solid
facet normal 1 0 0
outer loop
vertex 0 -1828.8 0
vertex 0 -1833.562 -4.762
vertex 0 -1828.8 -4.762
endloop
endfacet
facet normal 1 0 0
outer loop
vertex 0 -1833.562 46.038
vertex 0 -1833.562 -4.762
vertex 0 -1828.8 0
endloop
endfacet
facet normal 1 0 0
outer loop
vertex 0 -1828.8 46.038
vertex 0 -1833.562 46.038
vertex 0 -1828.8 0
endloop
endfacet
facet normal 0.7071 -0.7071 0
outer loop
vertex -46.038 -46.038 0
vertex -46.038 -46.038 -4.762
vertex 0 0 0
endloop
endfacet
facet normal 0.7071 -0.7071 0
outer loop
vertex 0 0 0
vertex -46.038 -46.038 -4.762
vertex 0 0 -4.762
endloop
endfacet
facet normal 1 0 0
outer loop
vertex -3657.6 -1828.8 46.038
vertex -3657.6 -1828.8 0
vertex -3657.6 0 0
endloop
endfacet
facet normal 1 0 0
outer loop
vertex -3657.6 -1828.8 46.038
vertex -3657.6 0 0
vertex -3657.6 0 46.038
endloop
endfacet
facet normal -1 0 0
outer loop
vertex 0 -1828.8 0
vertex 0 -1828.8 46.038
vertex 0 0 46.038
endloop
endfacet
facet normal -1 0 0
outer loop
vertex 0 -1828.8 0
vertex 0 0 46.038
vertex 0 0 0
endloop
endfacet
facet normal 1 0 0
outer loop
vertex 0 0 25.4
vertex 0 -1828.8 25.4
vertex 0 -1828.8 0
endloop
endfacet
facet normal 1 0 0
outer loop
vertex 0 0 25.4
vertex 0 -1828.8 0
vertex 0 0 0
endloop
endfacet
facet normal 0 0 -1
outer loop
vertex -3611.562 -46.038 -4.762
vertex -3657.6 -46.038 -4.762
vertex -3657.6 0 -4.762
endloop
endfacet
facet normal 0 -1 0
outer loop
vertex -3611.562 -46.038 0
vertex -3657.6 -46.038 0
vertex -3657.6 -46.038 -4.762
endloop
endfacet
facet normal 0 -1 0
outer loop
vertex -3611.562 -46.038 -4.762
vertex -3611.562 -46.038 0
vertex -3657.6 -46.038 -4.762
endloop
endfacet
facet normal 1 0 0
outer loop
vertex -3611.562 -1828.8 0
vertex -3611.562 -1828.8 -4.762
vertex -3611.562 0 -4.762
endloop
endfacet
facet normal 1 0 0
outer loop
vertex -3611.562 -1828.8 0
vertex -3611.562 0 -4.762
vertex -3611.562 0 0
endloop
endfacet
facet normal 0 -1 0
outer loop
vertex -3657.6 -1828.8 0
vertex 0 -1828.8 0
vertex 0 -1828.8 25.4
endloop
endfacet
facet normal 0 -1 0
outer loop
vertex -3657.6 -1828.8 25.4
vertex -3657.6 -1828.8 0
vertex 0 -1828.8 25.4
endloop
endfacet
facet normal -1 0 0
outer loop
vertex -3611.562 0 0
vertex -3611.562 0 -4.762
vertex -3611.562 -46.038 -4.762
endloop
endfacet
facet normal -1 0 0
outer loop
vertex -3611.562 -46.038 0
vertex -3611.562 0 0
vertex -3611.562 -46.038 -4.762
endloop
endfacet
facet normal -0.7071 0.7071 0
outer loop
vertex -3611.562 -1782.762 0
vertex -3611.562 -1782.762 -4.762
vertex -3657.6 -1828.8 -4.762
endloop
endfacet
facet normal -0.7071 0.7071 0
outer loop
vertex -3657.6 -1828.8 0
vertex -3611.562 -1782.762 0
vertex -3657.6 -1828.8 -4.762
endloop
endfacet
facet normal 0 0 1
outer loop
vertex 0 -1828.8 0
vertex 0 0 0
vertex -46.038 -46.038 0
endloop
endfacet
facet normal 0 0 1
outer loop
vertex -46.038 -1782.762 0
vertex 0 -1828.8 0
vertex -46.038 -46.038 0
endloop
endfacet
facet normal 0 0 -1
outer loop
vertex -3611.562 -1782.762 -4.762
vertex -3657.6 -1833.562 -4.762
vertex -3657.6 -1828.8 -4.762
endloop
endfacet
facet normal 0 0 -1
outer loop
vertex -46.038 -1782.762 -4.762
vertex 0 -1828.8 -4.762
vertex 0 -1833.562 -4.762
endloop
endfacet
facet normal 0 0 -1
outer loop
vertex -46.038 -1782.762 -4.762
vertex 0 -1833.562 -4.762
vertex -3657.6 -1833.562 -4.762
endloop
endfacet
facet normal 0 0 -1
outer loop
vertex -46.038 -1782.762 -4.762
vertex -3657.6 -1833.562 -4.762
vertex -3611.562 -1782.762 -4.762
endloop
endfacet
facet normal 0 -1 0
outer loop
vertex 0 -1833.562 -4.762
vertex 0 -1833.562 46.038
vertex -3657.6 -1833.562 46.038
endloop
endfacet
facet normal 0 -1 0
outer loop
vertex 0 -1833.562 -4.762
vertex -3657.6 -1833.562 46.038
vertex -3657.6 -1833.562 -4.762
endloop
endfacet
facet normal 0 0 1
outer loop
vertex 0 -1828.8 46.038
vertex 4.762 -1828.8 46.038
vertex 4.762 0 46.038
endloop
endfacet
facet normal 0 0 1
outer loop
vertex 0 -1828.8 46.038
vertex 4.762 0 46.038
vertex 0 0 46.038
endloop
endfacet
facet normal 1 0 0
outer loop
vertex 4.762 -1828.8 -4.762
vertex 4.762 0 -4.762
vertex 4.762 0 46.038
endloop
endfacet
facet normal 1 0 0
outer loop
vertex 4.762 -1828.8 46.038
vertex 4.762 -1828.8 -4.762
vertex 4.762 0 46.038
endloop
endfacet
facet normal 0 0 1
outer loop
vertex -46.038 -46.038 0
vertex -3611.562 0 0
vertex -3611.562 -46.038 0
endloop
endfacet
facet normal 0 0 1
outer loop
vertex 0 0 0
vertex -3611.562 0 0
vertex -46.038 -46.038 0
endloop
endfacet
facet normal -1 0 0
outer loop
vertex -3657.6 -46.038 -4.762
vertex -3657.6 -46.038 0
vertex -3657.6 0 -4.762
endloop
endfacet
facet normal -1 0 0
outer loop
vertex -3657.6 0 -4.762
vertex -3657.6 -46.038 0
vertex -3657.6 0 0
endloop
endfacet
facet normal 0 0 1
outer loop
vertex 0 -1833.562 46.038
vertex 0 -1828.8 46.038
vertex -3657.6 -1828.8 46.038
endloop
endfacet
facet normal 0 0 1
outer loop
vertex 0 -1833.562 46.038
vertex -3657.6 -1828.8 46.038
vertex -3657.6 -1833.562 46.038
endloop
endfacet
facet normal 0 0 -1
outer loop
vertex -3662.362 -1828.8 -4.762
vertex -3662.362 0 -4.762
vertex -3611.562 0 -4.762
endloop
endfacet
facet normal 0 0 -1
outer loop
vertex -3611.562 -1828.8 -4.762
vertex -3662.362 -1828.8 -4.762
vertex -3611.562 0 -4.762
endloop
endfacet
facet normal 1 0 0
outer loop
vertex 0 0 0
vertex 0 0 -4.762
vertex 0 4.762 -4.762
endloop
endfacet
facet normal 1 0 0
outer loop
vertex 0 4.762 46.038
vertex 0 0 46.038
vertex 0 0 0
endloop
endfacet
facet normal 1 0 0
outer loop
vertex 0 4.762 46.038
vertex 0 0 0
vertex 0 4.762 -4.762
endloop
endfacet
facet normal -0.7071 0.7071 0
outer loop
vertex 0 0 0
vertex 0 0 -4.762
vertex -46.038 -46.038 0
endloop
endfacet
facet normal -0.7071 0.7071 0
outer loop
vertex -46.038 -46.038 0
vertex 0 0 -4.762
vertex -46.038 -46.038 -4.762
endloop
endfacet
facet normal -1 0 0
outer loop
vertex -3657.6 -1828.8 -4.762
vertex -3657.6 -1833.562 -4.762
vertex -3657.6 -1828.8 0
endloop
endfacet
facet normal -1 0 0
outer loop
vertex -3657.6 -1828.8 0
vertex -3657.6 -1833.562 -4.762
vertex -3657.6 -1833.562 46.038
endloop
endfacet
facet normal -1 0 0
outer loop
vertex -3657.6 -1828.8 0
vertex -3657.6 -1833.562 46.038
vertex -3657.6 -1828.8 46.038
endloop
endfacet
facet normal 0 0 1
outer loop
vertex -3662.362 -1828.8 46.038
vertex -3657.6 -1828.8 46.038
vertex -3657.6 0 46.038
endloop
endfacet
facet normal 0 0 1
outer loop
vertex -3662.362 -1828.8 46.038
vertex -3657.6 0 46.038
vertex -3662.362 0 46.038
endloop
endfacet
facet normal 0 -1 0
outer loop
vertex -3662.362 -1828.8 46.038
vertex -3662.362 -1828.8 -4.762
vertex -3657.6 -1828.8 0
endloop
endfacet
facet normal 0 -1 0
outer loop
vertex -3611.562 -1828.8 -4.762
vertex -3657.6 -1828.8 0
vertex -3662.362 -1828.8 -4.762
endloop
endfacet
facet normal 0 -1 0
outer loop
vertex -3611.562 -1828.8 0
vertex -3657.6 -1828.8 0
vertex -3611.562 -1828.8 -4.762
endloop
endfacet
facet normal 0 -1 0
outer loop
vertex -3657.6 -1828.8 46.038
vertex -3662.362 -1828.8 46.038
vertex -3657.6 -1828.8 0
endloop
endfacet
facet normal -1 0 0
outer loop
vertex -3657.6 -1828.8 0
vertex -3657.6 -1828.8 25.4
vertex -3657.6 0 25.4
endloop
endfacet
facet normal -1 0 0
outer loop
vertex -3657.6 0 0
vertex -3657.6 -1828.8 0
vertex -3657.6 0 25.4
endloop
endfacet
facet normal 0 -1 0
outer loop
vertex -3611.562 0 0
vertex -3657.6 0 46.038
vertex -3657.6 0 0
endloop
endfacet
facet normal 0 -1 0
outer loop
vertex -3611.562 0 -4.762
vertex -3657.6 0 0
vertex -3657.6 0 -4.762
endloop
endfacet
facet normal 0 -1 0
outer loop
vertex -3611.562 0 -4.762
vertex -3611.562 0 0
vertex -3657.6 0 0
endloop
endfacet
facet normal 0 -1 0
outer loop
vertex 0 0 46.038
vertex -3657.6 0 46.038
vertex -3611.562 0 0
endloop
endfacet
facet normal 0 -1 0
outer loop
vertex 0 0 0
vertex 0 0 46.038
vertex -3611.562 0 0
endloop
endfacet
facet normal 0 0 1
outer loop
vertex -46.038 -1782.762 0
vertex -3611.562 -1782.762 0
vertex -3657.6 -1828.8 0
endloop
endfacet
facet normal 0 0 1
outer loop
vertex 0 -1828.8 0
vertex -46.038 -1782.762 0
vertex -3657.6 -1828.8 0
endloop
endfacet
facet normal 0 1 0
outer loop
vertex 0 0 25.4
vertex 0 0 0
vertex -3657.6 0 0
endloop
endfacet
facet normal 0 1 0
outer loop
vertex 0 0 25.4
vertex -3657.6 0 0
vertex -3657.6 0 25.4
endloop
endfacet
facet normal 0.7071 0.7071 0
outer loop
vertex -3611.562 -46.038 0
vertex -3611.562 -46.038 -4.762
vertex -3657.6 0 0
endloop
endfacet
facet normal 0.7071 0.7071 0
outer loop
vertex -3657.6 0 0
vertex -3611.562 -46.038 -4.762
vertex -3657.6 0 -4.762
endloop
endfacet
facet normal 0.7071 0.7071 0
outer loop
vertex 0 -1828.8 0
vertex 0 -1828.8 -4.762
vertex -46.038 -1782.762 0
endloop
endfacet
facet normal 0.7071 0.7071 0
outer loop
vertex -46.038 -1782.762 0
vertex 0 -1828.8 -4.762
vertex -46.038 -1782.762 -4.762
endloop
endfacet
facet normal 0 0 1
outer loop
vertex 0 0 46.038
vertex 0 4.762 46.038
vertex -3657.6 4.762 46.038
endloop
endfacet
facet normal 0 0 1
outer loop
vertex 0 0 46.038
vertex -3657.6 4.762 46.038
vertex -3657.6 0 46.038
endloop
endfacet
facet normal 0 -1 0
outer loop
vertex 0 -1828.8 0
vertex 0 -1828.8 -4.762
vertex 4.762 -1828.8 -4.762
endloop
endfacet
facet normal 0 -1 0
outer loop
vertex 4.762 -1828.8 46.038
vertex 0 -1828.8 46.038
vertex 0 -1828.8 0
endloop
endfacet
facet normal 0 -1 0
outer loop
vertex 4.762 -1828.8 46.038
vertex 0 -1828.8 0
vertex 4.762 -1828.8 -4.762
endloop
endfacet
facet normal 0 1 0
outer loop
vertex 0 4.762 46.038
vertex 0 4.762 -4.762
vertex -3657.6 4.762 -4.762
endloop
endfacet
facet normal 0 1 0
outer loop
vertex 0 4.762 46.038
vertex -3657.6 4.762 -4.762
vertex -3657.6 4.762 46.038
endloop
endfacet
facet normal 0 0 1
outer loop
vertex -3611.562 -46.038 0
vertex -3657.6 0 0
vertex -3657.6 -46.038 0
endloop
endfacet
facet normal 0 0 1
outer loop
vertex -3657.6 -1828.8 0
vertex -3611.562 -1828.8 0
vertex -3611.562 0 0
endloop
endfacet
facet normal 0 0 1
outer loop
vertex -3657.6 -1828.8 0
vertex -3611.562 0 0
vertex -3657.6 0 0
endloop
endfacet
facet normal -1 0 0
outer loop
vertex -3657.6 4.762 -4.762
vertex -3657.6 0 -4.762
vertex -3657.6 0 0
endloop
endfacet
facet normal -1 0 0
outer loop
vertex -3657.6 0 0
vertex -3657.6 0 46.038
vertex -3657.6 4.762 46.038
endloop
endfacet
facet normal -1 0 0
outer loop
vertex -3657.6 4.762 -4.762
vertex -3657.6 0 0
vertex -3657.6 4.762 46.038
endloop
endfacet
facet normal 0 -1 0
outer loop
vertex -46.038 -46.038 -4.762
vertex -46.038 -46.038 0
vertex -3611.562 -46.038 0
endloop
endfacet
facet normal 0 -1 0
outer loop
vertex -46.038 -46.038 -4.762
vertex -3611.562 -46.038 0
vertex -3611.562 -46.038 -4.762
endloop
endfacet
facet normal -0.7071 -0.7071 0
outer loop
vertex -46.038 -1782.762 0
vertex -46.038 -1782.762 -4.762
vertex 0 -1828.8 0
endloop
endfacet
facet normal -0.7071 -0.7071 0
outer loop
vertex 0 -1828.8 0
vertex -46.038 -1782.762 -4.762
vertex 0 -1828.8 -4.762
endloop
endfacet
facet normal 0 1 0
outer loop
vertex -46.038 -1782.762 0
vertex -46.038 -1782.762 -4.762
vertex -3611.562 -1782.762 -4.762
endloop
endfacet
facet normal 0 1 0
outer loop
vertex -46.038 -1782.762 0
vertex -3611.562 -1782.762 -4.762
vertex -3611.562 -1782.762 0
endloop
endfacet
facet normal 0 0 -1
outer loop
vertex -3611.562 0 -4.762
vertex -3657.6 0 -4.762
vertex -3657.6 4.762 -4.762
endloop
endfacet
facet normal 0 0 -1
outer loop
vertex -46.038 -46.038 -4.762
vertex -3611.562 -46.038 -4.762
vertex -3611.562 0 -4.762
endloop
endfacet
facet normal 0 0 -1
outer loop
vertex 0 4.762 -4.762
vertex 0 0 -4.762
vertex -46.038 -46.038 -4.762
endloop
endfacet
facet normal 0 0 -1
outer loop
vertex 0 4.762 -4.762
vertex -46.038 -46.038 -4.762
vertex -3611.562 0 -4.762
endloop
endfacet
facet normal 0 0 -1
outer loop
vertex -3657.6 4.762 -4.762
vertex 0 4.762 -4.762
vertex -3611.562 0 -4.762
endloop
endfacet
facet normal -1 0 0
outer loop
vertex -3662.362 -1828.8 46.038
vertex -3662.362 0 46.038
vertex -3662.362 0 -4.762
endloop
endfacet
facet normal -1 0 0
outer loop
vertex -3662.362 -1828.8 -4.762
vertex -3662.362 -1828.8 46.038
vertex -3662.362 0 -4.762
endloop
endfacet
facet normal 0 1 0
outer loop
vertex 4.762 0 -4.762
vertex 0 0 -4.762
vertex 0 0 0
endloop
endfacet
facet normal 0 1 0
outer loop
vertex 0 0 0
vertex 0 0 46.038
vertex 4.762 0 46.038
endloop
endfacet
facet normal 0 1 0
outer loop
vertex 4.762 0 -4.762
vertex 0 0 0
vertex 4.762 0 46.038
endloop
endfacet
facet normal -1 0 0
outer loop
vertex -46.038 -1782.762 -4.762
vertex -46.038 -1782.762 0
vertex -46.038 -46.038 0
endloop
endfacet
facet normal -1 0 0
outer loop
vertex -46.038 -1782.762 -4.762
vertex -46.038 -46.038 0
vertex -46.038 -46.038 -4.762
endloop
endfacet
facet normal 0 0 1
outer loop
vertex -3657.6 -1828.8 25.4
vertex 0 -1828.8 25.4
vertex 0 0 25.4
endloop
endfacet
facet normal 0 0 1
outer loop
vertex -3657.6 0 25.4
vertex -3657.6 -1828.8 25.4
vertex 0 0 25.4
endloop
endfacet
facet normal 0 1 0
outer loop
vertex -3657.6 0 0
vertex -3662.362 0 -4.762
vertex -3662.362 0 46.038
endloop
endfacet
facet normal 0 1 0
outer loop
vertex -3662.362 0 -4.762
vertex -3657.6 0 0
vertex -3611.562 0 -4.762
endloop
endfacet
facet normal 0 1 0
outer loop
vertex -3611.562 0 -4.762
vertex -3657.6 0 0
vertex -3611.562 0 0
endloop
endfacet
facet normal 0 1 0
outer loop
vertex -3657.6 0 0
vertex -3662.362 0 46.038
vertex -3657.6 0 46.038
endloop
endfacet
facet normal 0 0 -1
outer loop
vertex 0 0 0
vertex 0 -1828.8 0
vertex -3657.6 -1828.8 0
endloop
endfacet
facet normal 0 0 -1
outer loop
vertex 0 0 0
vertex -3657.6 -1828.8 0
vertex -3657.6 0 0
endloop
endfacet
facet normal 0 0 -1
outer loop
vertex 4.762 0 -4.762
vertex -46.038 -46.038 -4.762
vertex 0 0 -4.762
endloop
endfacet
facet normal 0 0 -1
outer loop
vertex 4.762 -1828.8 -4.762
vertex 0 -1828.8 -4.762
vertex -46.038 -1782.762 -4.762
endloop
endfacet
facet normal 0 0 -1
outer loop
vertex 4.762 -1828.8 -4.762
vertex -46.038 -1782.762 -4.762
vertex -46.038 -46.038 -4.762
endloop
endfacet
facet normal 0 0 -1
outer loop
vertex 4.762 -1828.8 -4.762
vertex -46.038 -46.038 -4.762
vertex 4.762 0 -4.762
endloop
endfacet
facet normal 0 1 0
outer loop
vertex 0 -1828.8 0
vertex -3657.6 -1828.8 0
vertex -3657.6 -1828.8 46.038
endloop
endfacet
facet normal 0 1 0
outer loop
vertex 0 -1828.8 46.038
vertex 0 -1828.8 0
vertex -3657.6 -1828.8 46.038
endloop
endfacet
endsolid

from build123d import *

# Parameters (mm, degrees)
F0_W      = 1828.8
F0_H      = 25.4
F1_DEPTH  = 3657.6
F3_DEPTH  = 3657.6
F5_DEPTH  = 3657.6
F7_DEPTH  = 4.7625
F9_DEPTH  = 1828.8
F11_DEPTH = 4.7625
F12_DEPTH = 1828.8
F14_DEPTH = 4.7625


with BuildPart() as f1:
    # F0 (on Right) → F1 (new body)
    with BuildSketch(Plane.YZ):
        with Locations((-914.4, 12.7)):
            Rectangle(F0_W, F0_H)
    extrude(amount=-F1_DEPTH)


with BuildPart() as f3:
    # F2 (on face) → F3 (new body, through all)
    with BuildSketch(Plane.YZ):
        Polygon((-1782.7625, 0), (-1828.8, 0), (-1828.8, 46.0375), (-1833.5625, 46.0375), (-1833.5625, -4.7625), (-1782.7625, -4.7625), align=None)
    extrude(amount=-F3_DEPTH)

    # F6 (on face) → F7 (cut, through all)
    with BuildSketch(Plane(origin=(0, 0, -4.7625), x_dir=(1, 0, 0), z_dir=(0, 0, -1))):
        Polygon((0, 1828.8), (-46.0375, 1782.7625), (0, 1782.7625), align=None)
        Polygon((-3657.6, 1828.8), (-3657.6, 1782.7625), (-3611.5625, 1782.7625), align=None)
    extrude(amount=-F7_DEPTH, mode=Mode.SUBTRACT)


with BuildPart() as f5:
    # F4 (on face) → F5 (new body, through all)
    with BuildSketch(Plane.YZ):
        Polygon((0, 46.0375), (0, 0), (-46.0375, 0), (-46.0375, -4.7625), (4.7625, -4.7625), (4.7625, 46.0375), align=None)
    extrude(amount=-F5_DEPTH)

    # F10 (on face) → F11 (cut, through all)
    with BuildSketch(Plane(origin=(0, 0, -4.7625), x_dir=(1, 0, 0), z_dir=(0, 0, -1))):
        Polygon((-3611.5625, 0), (-3611.5625, 46.0375), (-3657.6, 0), align=None)
        Polygon((-46.0375, 46.0375), (0, 0), (0, 46.0375), align=None)
    extrude(amount=-F11_DEPTH, mode=Mode.SUBTRACT)


with BuildPart() as f9:
    # F8 (on face) → F9 (new body, through all)
    with BuildSketch(Plane.XZ.offset(1828.8)):
        Polygon((-3611.5625, 0), (-3657.6, 0), (-3657.6, 25.4), (-3657.6, 46.0375), (-3662.3625, 46.0375), (-3662.3625, -4.7625), (-3611.5625, -4.7625), align=None)
    extrude(amount=-F9_DEPTH)


with BuildPart() as f12:
    # F8 (on face) → F12 (new body, through all)
    with BuildSketch(Plane.XZ.offset(1828.8)):
        Polygon((0, 0), (-46.0375, 0), (-46.0375, -4.7625), (4.7625, -4.7625), (4.7625, 46.0375), (0, 46.0375), (0, 25.4), align=None)
    extrude(amount=-F12_DEPTH)

    # F13 (on face) → F14 (cut, through all)
    with BuildSketch(Plane(origin=(0, 0, -4.7625), x_dir=(1, 0, 0), z_dir=(0, 0, -1))):
        Polygon((-46.0375, 1828.8), (-46.0375, 1782.7625), (0, 1828.8), align=None)
        Polygon((-46.0375, 0), (0, 0), (-46.0375, 46.0375), align=None)
    extrude(amount=-F14_DEPTH, mode=Mode.SUBTRACT)


solid = Compound([f1.part, f3.part, f5.part, f9.part, f12.part])
